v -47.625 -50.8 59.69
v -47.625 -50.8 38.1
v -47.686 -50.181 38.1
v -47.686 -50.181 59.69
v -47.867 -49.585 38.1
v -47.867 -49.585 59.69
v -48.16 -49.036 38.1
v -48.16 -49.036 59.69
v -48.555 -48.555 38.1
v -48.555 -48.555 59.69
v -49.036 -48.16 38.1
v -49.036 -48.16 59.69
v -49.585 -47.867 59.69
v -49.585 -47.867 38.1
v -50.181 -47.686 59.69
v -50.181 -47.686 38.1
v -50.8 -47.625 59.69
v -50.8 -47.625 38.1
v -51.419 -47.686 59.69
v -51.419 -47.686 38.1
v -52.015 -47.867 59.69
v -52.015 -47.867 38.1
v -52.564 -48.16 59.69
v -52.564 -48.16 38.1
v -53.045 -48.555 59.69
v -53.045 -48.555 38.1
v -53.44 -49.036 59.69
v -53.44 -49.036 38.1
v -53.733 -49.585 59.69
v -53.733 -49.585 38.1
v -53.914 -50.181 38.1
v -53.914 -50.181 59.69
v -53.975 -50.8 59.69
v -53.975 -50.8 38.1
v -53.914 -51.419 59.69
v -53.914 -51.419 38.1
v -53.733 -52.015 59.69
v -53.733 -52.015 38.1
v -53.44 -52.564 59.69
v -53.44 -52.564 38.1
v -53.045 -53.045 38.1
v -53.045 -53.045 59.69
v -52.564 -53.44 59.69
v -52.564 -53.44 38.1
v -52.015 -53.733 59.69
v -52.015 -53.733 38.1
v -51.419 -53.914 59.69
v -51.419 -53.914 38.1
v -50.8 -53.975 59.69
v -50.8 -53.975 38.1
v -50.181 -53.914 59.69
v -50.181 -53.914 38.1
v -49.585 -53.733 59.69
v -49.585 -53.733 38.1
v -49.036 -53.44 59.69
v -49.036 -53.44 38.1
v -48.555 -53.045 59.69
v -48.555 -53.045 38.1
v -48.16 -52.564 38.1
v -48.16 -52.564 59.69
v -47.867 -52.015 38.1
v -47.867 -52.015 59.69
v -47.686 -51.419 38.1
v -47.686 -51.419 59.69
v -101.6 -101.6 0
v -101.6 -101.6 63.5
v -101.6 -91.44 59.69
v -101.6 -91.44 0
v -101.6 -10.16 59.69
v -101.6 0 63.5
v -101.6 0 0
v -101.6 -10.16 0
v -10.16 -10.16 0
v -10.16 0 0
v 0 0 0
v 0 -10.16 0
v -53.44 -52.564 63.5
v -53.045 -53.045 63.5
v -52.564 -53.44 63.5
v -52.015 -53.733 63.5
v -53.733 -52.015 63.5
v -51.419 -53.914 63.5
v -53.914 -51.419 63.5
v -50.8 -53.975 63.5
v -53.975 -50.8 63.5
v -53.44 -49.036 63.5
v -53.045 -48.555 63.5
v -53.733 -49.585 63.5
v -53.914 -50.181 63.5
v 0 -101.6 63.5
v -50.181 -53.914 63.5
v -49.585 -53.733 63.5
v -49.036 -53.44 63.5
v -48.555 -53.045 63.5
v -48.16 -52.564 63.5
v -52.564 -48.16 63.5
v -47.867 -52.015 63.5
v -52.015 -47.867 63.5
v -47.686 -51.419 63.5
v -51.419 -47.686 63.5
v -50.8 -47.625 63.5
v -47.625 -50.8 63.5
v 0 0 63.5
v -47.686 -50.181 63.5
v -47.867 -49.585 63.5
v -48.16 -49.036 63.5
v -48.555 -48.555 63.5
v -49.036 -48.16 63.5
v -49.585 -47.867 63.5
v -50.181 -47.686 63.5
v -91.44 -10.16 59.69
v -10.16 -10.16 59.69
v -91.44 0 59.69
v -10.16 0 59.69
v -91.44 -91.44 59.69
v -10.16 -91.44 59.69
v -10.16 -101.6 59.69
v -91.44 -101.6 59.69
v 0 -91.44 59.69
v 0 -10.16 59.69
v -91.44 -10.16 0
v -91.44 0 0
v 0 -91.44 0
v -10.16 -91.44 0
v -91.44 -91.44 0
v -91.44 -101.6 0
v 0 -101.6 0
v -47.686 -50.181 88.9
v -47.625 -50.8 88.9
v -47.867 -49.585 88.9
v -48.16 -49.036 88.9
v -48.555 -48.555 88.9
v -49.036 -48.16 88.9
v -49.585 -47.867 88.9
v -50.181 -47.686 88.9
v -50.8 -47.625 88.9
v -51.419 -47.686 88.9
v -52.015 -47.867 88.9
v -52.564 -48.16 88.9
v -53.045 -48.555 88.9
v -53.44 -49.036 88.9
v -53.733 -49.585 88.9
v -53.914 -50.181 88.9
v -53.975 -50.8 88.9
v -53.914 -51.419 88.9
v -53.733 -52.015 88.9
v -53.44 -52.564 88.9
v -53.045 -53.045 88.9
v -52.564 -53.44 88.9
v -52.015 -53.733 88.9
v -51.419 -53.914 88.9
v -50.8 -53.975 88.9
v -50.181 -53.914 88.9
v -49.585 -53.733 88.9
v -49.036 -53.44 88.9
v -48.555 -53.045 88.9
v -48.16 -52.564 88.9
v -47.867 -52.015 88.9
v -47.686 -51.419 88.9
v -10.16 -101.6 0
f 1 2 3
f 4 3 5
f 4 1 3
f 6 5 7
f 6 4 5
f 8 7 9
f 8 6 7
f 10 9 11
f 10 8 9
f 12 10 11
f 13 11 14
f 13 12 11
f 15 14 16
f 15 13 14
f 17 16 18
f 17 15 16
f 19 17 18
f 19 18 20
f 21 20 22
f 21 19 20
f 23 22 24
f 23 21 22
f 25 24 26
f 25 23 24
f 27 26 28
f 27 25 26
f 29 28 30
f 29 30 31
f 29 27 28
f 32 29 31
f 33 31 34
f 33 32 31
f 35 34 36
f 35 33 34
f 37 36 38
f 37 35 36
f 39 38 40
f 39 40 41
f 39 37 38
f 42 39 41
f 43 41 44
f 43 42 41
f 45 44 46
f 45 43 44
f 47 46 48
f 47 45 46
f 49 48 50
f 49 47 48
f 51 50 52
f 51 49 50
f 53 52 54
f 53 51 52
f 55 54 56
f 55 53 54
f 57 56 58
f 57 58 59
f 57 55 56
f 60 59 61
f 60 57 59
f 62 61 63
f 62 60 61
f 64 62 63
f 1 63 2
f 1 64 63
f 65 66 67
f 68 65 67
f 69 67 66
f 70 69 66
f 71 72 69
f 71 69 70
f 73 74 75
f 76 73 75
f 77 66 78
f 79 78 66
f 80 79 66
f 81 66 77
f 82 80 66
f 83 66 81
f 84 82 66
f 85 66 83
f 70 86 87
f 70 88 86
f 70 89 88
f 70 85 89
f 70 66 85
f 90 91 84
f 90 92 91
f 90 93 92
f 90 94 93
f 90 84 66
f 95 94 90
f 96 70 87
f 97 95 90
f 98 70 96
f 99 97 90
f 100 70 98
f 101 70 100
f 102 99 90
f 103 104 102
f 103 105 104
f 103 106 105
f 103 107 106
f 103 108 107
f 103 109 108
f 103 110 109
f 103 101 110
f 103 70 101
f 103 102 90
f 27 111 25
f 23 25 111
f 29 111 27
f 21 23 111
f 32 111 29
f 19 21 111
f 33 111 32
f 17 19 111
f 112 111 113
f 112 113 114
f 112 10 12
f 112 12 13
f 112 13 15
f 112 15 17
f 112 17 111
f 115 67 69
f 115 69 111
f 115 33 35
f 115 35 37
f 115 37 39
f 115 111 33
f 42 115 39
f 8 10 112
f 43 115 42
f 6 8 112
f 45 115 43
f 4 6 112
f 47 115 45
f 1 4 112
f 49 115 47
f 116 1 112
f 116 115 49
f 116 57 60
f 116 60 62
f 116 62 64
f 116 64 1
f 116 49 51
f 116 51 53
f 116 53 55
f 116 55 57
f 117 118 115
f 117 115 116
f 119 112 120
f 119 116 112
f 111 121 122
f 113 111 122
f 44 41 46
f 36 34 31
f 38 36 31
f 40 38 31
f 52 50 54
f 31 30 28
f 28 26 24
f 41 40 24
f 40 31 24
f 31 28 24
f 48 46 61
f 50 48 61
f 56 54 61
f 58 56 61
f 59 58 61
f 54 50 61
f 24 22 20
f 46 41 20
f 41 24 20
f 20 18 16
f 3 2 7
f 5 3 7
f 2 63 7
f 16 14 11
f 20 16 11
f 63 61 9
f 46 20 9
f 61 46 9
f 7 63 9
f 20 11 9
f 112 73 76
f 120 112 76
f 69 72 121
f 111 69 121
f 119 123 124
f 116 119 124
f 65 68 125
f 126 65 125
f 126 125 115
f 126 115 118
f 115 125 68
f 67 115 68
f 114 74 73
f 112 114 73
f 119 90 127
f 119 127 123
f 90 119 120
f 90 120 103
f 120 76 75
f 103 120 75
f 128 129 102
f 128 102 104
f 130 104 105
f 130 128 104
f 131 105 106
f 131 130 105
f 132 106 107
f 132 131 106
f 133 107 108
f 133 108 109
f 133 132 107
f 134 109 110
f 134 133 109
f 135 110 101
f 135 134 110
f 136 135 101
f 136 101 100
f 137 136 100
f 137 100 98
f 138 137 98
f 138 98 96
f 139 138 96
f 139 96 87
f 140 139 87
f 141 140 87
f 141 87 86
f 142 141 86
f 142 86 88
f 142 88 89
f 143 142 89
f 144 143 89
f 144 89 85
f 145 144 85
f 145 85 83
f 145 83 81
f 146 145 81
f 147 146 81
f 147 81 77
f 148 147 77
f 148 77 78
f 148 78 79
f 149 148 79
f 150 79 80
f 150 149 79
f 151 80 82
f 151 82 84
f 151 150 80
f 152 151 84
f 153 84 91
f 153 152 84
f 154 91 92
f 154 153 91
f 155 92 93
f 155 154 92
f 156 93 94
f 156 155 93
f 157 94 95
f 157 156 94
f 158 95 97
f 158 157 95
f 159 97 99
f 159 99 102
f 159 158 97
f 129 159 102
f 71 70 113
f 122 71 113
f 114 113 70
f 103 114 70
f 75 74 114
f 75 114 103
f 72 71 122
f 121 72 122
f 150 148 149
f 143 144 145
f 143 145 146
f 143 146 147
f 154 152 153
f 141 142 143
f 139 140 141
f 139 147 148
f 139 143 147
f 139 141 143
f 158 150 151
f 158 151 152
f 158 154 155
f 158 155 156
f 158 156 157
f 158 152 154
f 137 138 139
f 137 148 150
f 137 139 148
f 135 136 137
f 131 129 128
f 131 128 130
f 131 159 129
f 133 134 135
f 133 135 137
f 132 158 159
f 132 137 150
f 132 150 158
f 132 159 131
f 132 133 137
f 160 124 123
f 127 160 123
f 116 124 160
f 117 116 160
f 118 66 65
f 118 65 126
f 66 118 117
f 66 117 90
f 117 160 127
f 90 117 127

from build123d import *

# Parameters (mm, degrees)
F0_W     = 101.6
F0_H     = 101.6
F1_DEPTH = 63.5
F2_W     = 81.28
F2_H     = 81.28
F2_W_2   = 10.16
F2_H_2   = 10.16
F3_DEPTH = 59.69
F5_DEPTH = 63.501
F6_R     = 3.175
F7_DEPTH = 25.4


with BuildPart() as f1:
    # F0 (on Top) → F1 (new body)
    with BuildSketch(Plane.XY):
        with Locations((-50.8, -50.8)):
            Rectangle(F0_W, F0_H)
    extrude(amount=F1_DEPTH)

    # F2 (on face) → F3 (cut)
    with BuildSketch(Plane(origin=(0, 0, 0), x_dir=(1, 0, 0), z_dir=(0, 0, -1))):
        with Locations((-50.8, 50.8)):
            Rectangle(F2_W, F2_H)
        with Locations((-5.08, 50.8)):
            Rectangle(F2_W_2, F2_H)
        with Locations((-50.8, 5.08)):
            Rectangle(F2_W, F2_H_2)
        with Locations((-96.52, 50.8)):
            Rectangle(F2_W_2, F2_H)
        with Locations((-50.8, 96.52)):
            Rectangle(F2_W, F2_H_2)
    extrude(amount=-F3_DEPTH, mode=Mode.SUBTRACT)

    # F4 (on face) → F5 (cut, through all)
    with BuildSketch(Plane.XY.offset(63.5)):
        with BuildLine():
            ThreePointArc((-47.625, -50.8), (-49.5849801022, -47.8666824843), (-53.0450640303, -48.5549359697))
            Line((-53.0450640303, -48.5549359697), (-48.5549359697, -53.0450640303))
            ThreePointArc((-48.5549359697, -53.0450640303), (-47.8666824843, -52.0150198978), (-47.625, -50.8))
        make_face()
        with BuildLine():
            Line((-48.5549359697, -53.0450640303), (-53.0450640303, -48.5549359697))
            ThreePointArc((-53.0450640303, -48.5549359697), (-53.0450640303, -53.0450640303), (-48.5549359697, -53.0450640303))
        make_face()
    extrude(amount=-F5_DEPTH, mode=Mode.SUBTRACT)

    # F6 (on face) → F7 (join, symmetric)
    with BuildSketch(Plane.XY.offset(63.5)):
        with Locations((-50.8, -50.8)):
            Circle(F6_R)
    extrude(amount=F7_DEPTH, both=True)


solid = f1.part
